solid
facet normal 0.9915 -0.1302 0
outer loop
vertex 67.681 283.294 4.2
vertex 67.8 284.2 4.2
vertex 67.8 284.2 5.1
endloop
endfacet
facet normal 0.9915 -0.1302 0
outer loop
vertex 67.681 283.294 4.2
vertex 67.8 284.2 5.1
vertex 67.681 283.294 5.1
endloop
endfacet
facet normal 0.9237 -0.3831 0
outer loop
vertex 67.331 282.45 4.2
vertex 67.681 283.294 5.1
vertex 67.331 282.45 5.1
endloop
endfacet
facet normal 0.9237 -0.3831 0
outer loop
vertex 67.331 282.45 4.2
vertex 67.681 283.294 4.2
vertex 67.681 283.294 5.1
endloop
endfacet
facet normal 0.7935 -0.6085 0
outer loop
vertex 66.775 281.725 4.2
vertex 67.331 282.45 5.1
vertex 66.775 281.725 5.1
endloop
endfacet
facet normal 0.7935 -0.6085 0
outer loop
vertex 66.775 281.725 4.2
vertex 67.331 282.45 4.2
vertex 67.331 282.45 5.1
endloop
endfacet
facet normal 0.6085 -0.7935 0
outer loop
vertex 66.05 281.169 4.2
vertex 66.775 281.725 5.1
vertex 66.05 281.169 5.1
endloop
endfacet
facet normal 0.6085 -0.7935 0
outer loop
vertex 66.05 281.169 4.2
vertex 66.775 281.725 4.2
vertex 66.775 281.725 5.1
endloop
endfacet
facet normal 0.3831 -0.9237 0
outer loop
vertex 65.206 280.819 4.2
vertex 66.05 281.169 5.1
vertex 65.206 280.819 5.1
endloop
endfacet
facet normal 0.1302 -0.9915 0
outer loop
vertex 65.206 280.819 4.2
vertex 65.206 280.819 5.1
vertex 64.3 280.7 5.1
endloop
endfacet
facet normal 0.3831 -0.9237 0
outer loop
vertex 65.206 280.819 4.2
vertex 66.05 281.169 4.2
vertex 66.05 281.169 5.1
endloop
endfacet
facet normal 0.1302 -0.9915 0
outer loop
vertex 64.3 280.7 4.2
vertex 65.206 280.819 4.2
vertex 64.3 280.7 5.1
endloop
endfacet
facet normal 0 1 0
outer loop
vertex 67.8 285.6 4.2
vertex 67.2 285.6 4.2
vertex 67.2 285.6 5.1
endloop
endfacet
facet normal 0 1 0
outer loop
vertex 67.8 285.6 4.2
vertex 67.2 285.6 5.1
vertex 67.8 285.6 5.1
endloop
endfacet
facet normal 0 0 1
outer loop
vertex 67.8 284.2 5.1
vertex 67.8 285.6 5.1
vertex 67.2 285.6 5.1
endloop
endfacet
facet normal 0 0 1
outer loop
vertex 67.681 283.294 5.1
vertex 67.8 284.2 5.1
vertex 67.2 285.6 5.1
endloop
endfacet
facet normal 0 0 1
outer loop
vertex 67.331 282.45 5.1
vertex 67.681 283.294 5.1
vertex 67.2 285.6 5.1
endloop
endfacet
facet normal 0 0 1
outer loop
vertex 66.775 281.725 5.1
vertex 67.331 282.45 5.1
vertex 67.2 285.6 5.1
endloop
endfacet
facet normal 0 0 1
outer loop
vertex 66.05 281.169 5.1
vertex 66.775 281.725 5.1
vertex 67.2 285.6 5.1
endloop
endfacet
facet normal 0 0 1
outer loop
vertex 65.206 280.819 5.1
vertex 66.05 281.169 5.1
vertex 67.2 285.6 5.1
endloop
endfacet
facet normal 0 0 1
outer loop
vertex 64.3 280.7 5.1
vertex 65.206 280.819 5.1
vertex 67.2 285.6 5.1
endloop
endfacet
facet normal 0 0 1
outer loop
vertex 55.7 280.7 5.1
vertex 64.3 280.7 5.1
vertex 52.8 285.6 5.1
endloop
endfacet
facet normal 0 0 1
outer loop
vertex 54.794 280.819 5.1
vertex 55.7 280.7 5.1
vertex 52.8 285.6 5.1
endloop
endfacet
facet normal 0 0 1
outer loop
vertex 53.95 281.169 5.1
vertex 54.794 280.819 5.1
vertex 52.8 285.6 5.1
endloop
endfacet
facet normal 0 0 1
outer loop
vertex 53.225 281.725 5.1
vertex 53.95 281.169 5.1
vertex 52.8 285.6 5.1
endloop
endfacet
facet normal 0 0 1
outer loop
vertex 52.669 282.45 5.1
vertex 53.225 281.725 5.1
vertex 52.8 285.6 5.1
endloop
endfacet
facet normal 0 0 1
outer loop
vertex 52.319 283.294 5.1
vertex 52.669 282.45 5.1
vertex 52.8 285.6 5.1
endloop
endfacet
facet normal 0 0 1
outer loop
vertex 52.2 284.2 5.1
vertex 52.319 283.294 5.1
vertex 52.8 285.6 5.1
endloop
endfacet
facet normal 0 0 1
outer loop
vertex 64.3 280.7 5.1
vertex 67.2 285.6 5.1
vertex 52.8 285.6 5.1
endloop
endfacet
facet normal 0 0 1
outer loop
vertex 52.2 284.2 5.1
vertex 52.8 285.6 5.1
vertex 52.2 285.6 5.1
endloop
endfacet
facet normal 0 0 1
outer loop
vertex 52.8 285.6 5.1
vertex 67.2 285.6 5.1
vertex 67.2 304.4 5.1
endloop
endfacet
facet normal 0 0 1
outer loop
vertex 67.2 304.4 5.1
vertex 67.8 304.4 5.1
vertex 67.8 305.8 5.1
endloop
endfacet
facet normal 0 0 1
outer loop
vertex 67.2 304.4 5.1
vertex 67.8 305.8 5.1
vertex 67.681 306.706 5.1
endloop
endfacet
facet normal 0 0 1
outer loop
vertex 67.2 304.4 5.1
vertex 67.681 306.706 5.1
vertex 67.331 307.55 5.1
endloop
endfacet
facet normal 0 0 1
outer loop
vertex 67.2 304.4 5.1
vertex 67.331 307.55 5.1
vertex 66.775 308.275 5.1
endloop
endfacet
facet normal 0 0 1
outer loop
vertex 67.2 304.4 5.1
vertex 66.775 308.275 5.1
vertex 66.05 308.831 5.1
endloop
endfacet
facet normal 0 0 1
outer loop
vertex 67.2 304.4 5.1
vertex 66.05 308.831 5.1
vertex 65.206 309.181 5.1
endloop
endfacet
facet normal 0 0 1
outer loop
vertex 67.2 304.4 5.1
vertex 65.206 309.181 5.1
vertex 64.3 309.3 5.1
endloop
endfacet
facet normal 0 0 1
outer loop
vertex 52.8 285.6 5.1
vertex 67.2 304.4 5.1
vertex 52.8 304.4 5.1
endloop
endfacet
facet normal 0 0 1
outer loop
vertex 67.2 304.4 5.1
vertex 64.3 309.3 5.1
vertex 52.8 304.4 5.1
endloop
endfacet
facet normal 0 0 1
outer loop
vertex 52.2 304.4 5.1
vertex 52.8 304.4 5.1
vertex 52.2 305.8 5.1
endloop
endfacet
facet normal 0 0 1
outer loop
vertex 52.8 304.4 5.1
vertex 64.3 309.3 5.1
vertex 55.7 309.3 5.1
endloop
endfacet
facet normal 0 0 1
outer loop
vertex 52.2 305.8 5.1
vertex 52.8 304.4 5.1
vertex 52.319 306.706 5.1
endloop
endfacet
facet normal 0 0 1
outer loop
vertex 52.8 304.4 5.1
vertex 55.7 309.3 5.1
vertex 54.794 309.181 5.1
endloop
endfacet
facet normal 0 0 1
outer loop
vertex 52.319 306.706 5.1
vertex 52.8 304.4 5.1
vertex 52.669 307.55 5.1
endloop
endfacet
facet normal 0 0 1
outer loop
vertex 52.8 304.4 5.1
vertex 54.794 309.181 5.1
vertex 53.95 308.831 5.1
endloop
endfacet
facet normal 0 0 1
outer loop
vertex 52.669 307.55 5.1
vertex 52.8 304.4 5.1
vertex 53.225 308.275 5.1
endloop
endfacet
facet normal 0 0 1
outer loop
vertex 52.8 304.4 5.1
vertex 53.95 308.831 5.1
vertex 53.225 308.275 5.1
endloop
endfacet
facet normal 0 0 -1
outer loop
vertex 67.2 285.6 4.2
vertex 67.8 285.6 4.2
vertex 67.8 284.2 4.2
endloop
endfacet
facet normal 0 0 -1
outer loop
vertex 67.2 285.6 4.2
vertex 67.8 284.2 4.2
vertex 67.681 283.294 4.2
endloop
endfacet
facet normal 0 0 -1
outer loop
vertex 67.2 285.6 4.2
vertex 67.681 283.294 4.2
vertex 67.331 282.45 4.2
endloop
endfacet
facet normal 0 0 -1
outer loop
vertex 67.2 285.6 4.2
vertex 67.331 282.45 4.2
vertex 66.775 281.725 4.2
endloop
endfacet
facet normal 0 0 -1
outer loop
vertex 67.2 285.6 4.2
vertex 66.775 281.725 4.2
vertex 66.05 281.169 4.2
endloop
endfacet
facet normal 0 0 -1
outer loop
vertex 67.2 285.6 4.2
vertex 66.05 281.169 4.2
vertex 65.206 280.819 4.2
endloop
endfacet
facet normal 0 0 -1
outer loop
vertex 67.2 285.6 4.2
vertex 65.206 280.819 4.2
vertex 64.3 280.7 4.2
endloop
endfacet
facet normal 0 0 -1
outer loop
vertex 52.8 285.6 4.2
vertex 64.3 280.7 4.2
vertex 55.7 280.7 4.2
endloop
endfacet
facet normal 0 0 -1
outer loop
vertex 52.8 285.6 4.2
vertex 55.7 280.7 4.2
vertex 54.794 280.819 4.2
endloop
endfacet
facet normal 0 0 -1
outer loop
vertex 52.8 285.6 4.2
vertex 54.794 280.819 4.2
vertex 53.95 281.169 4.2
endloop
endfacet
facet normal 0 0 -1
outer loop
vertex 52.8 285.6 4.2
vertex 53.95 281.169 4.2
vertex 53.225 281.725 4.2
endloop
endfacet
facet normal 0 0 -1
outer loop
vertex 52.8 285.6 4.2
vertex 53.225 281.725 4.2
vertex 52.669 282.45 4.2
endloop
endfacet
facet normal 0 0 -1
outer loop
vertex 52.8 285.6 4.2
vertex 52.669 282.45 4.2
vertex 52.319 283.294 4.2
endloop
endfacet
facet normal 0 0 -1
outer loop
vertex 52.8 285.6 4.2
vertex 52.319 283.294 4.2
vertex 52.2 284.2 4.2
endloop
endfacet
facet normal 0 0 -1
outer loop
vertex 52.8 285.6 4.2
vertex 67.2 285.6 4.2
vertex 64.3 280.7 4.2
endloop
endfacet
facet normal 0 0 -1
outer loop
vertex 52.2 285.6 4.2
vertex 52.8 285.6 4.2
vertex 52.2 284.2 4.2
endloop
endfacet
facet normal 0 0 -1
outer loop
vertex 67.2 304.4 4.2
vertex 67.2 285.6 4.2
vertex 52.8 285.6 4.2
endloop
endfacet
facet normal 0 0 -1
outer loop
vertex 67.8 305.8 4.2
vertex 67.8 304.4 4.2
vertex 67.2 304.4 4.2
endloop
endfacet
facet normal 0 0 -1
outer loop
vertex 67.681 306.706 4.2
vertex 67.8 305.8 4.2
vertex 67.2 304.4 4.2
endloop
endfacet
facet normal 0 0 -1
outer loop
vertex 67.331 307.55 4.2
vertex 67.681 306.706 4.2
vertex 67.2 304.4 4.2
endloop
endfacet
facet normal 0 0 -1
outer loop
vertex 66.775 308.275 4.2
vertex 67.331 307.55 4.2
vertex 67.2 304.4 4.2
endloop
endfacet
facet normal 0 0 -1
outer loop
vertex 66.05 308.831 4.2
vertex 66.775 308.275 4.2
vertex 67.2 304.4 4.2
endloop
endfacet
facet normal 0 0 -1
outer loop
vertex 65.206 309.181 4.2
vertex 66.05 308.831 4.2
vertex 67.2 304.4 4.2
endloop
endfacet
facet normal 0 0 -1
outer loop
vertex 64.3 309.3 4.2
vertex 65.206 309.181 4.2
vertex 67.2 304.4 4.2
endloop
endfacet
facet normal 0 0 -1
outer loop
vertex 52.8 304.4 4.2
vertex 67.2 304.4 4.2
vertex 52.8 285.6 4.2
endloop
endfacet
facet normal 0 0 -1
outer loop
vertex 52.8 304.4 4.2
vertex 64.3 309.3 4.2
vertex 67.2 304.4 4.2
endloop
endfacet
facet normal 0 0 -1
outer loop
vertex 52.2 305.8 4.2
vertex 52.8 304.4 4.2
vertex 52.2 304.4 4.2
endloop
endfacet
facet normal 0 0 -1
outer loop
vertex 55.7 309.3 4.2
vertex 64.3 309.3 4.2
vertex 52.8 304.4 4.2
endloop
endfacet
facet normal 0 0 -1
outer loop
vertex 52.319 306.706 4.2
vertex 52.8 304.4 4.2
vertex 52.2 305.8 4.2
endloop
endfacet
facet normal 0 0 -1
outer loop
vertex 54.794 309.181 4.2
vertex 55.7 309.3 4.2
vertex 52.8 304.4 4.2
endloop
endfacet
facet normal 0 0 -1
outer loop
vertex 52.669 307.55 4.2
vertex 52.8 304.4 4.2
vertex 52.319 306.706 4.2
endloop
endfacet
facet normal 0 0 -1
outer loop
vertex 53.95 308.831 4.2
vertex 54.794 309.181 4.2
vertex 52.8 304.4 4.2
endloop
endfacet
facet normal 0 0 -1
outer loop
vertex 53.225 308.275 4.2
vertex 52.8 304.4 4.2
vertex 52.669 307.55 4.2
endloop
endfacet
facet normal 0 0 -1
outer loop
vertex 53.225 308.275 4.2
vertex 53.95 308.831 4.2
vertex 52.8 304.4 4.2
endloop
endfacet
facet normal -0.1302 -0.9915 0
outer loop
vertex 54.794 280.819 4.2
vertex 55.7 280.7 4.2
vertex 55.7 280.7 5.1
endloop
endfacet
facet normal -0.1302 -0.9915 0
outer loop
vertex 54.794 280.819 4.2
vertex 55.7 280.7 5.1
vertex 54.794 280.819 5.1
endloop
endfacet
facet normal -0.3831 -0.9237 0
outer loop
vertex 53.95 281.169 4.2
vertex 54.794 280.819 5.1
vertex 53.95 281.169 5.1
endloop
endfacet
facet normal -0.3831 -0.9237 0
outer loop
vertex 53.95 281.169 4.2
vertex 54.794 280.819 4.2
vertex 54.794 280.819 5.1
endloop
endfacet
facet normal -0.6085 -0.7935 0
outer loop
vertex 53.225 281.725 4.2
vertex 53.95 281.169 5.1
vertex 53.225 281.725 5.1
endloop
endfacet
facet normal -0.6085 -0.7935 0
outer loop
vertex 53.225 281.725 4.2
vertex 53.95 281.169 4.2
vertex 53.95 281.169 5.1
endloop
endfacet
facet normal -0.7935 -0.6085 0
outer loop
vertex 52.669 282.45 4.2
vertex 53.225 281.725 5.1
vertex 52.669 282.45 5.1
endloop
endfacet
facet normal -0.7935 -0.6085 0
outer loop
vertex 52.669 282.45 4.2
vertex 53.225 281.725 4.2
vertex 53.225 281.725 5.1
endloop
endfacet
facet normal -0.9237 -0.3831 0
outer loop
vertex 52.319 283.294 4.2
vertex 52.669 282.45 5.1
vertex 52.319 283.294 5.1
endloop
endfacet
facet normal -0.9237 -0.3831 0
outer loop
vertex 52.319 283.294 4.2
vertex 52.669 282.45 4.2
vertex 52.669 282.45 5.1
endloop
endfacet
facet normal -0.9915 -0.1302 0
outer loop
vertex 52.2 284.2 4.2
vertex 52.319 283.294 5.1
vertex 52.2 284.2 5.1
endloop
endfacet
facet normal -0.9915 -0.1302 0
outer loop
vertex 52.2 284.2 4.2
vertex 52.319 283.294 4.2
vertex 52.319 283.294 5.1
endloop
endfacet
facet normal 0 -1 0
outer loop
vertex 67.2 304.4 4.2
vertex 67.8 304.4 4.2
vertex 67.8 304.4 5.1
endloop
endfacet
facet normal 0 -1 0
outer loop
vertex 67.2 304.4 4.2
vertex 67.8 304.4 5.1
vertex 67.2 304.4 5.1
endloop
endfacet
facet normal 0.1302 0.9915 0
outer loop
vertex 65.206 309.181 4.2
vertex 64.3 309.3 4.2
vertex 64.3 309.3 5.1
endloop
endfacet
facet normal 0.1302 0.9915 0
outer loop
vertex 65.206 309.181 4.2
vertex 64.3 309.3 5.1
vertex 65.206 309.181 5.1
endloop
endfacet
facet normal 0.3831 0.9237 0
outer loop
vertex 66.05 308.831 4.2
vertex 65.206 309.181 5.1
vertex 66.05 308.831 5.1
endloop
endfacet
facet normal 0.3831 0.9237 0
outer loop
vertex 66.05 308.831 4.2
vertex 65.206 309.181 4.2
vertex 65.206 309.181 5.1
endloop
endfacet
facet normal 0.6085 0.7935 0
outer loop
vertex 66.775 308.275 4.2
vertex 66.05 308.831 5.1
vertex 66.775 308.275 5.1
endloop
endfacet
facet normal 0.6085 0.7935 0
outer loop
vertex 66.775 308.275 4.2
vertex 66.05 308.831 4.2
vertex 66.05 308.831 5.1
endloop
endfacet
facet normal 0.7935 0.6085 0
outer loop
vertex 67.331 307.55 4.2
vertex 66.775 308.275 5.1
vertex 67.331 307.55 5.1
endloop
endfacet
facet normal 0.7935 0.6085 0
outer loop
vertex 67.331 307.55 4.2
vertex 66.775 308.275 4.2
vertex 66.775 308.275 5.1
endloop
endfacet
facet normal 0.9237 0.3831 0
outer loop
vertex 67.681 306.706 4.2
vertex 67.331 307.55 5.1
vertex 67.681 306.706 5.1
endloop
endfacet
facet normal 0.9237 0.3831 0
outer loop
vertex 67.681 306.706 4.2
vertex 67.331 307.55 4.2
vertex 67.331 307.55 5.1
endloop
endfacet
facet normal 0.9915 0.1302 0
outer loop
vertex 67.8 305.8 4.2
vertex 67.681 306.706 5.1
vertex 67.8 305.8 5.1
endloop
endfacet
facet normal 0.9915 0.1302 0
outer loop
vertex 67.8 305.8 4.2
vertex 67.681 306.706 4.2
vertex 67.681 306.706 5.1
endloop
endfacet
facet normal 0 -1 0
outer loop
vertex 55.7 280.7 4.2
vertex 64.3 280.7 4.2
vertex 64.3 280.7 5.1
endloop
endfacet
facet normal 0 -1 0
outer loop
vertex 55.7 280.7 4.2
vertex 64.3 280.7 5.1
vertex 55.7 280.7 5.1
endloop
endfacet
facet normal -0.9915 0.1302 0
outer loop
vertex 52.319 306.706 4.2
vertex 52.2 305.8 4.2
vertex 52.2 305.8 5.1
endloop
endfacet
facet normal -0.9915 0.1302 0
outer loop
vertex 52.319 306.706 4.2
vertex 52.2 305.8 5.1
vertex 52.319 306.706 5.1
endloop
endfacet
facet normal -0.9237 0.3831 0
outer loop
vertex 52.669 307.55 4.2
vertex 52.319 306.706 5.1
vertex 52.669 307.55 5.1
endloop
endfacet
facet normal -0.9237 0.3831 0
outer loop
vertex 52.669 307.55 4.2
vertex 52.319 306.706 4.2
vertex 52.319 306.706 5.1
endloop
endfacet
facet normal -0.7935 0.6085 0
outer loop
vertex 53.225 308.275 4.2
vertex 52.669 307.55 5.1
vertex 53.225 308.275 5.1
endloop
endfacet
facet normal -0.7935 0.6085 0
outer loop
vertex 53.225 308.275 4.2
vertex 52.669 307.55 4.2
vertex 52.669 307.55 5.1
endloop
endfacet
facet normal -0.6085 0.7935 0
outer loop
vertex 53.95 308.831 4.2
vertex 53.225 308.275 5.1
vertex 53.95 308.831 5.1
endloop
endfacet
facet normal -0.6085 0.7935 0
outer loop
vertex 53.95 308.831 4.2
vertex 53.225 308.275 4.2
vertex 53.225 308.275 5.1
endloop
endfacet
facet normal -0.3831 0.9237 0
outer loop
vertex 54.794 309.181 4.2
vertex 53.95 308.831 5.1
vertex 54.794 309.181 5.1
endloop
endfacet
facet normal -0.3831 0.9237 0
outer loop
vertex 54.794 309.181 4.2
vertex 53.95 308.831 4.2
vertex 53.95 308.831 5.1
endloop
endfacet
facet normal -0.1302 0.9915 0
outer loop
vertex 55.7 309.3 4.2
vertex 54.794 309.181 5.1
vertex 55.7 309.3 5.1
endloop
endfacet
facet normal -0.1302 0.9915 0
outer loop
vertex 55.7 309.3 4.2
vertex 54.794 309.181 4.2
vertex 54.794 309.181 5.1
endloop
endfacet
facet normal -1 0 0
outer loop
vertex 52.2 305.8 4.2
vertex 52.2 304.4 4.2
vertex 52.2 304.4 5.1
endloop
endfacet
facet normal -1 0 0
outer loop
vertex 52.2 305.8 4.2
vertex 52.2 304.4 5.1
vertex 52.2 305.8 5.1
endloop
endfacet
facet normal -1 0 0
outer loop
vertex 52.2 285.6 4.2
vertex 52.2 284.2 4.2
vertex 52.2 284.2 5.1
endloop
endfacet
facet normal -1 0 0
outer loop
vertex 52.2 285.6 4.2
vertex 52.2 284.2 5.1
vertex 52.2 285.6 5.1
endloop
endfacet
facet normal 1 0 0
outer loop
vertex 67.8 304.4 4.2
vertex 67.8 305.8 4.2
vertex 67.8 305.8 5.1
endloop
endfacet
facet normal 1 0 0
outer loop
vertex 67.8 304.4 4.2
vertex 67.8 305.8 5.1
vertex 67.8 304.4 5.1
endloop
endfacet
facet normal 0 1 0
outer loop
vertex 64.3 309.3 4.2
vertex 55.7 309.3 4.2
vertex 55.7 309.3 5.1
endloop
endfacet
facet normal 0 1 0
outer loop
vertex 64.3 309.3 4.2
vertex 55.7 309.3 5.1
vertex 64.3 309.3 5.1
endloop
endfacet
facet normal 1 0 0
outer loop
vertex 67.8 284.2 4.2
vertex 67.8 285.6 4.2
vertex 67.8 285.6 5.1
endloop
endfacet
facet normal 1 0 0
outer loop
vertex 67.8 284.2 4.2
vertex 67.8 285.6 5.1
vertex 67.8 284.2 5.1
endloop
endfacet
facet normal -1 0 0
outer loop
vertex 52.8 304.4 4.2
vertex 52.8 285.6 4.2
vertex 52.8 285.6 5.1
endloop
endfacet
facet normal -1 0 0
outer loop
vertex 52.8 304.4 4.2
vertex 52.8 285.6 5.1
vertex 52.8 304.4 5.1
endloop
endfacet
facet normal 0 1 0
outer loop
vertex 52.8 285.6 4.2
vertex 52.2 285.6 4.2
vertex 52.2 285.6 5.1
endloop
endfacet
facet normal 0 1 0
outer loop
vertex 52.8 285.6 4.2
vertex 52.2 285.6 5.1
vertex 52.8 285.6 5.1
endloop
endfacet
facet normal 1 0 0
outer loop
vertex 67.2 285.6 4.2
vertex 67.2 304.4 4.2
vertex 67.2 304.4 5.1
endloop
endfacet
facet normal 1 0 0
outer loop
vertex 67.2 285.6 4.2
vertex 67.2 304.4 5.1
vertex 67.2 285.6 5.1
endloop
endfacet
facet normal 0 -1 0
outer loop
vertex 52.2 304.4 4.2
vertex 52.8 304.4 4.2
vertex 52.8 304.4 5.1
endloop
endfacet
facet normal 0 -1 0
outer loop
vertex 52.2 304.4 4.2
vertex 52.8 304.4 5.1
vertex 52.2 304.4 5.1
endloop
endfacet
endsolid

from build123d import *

# Parameters (mm, degrees)
EXTRUDE1_DEPTH = 0.9


with BuildPart() as part:
    # Sketch1 → Extrude1 (new body)
    with BuildSketch(Plane(origin=(0, 0, 4.2), x_dir=(-1, 0, 0), z_dir=(0, 0, -1))):
        with BuildLine():
            Line((-55.7, 309.3), (-64.3, 309.3))
            ThreePointArc((-64.3, 309.3), (-66.774873734, 308.274873734), (-67.8, 305.8))
            Line((-67.8, 305.8), (-67.8, 304.4))
            Line((-67.8, 304.4), (-67.2, 304.4))
            Line((-67.2, 304.4), (-67.2, 285.6))
            Line((-67.2, 285.6), (-67.8, 285.6))
            Line((-67.8, 285.6), (-67.8, 284.2))
            ThreePointArc((-67.8, 284.2), (-66.774873734, 281.725126266), (-64.3, 280.7))
            Line((-64.3, 280.7), (-55.7, 280.7))
            ThreePointArc((-55.7, 280.7), (-53.225126266, 281.725126266), (-52.2, 284.2))
            Line((-52.2, 284.2), (-52.2, 285.6))
            Line((-52.2, 285.6), (-52.8, 285.6))
            Line((-52.8, 285.6), (-52.8, 304.4))
            Line((-52.8, 304.4), (-52.2, 304.4))
            Line((-52.2, 304.4), (-52.2, 305.8))
            ThreePointArc((-52.2, 305.8), (-53.225126266, 308.274873734), (-55.7, 309.3))
        make_face()
    extrude(amount=-EXTRUDE1_DEPTH)


solid = part.part
